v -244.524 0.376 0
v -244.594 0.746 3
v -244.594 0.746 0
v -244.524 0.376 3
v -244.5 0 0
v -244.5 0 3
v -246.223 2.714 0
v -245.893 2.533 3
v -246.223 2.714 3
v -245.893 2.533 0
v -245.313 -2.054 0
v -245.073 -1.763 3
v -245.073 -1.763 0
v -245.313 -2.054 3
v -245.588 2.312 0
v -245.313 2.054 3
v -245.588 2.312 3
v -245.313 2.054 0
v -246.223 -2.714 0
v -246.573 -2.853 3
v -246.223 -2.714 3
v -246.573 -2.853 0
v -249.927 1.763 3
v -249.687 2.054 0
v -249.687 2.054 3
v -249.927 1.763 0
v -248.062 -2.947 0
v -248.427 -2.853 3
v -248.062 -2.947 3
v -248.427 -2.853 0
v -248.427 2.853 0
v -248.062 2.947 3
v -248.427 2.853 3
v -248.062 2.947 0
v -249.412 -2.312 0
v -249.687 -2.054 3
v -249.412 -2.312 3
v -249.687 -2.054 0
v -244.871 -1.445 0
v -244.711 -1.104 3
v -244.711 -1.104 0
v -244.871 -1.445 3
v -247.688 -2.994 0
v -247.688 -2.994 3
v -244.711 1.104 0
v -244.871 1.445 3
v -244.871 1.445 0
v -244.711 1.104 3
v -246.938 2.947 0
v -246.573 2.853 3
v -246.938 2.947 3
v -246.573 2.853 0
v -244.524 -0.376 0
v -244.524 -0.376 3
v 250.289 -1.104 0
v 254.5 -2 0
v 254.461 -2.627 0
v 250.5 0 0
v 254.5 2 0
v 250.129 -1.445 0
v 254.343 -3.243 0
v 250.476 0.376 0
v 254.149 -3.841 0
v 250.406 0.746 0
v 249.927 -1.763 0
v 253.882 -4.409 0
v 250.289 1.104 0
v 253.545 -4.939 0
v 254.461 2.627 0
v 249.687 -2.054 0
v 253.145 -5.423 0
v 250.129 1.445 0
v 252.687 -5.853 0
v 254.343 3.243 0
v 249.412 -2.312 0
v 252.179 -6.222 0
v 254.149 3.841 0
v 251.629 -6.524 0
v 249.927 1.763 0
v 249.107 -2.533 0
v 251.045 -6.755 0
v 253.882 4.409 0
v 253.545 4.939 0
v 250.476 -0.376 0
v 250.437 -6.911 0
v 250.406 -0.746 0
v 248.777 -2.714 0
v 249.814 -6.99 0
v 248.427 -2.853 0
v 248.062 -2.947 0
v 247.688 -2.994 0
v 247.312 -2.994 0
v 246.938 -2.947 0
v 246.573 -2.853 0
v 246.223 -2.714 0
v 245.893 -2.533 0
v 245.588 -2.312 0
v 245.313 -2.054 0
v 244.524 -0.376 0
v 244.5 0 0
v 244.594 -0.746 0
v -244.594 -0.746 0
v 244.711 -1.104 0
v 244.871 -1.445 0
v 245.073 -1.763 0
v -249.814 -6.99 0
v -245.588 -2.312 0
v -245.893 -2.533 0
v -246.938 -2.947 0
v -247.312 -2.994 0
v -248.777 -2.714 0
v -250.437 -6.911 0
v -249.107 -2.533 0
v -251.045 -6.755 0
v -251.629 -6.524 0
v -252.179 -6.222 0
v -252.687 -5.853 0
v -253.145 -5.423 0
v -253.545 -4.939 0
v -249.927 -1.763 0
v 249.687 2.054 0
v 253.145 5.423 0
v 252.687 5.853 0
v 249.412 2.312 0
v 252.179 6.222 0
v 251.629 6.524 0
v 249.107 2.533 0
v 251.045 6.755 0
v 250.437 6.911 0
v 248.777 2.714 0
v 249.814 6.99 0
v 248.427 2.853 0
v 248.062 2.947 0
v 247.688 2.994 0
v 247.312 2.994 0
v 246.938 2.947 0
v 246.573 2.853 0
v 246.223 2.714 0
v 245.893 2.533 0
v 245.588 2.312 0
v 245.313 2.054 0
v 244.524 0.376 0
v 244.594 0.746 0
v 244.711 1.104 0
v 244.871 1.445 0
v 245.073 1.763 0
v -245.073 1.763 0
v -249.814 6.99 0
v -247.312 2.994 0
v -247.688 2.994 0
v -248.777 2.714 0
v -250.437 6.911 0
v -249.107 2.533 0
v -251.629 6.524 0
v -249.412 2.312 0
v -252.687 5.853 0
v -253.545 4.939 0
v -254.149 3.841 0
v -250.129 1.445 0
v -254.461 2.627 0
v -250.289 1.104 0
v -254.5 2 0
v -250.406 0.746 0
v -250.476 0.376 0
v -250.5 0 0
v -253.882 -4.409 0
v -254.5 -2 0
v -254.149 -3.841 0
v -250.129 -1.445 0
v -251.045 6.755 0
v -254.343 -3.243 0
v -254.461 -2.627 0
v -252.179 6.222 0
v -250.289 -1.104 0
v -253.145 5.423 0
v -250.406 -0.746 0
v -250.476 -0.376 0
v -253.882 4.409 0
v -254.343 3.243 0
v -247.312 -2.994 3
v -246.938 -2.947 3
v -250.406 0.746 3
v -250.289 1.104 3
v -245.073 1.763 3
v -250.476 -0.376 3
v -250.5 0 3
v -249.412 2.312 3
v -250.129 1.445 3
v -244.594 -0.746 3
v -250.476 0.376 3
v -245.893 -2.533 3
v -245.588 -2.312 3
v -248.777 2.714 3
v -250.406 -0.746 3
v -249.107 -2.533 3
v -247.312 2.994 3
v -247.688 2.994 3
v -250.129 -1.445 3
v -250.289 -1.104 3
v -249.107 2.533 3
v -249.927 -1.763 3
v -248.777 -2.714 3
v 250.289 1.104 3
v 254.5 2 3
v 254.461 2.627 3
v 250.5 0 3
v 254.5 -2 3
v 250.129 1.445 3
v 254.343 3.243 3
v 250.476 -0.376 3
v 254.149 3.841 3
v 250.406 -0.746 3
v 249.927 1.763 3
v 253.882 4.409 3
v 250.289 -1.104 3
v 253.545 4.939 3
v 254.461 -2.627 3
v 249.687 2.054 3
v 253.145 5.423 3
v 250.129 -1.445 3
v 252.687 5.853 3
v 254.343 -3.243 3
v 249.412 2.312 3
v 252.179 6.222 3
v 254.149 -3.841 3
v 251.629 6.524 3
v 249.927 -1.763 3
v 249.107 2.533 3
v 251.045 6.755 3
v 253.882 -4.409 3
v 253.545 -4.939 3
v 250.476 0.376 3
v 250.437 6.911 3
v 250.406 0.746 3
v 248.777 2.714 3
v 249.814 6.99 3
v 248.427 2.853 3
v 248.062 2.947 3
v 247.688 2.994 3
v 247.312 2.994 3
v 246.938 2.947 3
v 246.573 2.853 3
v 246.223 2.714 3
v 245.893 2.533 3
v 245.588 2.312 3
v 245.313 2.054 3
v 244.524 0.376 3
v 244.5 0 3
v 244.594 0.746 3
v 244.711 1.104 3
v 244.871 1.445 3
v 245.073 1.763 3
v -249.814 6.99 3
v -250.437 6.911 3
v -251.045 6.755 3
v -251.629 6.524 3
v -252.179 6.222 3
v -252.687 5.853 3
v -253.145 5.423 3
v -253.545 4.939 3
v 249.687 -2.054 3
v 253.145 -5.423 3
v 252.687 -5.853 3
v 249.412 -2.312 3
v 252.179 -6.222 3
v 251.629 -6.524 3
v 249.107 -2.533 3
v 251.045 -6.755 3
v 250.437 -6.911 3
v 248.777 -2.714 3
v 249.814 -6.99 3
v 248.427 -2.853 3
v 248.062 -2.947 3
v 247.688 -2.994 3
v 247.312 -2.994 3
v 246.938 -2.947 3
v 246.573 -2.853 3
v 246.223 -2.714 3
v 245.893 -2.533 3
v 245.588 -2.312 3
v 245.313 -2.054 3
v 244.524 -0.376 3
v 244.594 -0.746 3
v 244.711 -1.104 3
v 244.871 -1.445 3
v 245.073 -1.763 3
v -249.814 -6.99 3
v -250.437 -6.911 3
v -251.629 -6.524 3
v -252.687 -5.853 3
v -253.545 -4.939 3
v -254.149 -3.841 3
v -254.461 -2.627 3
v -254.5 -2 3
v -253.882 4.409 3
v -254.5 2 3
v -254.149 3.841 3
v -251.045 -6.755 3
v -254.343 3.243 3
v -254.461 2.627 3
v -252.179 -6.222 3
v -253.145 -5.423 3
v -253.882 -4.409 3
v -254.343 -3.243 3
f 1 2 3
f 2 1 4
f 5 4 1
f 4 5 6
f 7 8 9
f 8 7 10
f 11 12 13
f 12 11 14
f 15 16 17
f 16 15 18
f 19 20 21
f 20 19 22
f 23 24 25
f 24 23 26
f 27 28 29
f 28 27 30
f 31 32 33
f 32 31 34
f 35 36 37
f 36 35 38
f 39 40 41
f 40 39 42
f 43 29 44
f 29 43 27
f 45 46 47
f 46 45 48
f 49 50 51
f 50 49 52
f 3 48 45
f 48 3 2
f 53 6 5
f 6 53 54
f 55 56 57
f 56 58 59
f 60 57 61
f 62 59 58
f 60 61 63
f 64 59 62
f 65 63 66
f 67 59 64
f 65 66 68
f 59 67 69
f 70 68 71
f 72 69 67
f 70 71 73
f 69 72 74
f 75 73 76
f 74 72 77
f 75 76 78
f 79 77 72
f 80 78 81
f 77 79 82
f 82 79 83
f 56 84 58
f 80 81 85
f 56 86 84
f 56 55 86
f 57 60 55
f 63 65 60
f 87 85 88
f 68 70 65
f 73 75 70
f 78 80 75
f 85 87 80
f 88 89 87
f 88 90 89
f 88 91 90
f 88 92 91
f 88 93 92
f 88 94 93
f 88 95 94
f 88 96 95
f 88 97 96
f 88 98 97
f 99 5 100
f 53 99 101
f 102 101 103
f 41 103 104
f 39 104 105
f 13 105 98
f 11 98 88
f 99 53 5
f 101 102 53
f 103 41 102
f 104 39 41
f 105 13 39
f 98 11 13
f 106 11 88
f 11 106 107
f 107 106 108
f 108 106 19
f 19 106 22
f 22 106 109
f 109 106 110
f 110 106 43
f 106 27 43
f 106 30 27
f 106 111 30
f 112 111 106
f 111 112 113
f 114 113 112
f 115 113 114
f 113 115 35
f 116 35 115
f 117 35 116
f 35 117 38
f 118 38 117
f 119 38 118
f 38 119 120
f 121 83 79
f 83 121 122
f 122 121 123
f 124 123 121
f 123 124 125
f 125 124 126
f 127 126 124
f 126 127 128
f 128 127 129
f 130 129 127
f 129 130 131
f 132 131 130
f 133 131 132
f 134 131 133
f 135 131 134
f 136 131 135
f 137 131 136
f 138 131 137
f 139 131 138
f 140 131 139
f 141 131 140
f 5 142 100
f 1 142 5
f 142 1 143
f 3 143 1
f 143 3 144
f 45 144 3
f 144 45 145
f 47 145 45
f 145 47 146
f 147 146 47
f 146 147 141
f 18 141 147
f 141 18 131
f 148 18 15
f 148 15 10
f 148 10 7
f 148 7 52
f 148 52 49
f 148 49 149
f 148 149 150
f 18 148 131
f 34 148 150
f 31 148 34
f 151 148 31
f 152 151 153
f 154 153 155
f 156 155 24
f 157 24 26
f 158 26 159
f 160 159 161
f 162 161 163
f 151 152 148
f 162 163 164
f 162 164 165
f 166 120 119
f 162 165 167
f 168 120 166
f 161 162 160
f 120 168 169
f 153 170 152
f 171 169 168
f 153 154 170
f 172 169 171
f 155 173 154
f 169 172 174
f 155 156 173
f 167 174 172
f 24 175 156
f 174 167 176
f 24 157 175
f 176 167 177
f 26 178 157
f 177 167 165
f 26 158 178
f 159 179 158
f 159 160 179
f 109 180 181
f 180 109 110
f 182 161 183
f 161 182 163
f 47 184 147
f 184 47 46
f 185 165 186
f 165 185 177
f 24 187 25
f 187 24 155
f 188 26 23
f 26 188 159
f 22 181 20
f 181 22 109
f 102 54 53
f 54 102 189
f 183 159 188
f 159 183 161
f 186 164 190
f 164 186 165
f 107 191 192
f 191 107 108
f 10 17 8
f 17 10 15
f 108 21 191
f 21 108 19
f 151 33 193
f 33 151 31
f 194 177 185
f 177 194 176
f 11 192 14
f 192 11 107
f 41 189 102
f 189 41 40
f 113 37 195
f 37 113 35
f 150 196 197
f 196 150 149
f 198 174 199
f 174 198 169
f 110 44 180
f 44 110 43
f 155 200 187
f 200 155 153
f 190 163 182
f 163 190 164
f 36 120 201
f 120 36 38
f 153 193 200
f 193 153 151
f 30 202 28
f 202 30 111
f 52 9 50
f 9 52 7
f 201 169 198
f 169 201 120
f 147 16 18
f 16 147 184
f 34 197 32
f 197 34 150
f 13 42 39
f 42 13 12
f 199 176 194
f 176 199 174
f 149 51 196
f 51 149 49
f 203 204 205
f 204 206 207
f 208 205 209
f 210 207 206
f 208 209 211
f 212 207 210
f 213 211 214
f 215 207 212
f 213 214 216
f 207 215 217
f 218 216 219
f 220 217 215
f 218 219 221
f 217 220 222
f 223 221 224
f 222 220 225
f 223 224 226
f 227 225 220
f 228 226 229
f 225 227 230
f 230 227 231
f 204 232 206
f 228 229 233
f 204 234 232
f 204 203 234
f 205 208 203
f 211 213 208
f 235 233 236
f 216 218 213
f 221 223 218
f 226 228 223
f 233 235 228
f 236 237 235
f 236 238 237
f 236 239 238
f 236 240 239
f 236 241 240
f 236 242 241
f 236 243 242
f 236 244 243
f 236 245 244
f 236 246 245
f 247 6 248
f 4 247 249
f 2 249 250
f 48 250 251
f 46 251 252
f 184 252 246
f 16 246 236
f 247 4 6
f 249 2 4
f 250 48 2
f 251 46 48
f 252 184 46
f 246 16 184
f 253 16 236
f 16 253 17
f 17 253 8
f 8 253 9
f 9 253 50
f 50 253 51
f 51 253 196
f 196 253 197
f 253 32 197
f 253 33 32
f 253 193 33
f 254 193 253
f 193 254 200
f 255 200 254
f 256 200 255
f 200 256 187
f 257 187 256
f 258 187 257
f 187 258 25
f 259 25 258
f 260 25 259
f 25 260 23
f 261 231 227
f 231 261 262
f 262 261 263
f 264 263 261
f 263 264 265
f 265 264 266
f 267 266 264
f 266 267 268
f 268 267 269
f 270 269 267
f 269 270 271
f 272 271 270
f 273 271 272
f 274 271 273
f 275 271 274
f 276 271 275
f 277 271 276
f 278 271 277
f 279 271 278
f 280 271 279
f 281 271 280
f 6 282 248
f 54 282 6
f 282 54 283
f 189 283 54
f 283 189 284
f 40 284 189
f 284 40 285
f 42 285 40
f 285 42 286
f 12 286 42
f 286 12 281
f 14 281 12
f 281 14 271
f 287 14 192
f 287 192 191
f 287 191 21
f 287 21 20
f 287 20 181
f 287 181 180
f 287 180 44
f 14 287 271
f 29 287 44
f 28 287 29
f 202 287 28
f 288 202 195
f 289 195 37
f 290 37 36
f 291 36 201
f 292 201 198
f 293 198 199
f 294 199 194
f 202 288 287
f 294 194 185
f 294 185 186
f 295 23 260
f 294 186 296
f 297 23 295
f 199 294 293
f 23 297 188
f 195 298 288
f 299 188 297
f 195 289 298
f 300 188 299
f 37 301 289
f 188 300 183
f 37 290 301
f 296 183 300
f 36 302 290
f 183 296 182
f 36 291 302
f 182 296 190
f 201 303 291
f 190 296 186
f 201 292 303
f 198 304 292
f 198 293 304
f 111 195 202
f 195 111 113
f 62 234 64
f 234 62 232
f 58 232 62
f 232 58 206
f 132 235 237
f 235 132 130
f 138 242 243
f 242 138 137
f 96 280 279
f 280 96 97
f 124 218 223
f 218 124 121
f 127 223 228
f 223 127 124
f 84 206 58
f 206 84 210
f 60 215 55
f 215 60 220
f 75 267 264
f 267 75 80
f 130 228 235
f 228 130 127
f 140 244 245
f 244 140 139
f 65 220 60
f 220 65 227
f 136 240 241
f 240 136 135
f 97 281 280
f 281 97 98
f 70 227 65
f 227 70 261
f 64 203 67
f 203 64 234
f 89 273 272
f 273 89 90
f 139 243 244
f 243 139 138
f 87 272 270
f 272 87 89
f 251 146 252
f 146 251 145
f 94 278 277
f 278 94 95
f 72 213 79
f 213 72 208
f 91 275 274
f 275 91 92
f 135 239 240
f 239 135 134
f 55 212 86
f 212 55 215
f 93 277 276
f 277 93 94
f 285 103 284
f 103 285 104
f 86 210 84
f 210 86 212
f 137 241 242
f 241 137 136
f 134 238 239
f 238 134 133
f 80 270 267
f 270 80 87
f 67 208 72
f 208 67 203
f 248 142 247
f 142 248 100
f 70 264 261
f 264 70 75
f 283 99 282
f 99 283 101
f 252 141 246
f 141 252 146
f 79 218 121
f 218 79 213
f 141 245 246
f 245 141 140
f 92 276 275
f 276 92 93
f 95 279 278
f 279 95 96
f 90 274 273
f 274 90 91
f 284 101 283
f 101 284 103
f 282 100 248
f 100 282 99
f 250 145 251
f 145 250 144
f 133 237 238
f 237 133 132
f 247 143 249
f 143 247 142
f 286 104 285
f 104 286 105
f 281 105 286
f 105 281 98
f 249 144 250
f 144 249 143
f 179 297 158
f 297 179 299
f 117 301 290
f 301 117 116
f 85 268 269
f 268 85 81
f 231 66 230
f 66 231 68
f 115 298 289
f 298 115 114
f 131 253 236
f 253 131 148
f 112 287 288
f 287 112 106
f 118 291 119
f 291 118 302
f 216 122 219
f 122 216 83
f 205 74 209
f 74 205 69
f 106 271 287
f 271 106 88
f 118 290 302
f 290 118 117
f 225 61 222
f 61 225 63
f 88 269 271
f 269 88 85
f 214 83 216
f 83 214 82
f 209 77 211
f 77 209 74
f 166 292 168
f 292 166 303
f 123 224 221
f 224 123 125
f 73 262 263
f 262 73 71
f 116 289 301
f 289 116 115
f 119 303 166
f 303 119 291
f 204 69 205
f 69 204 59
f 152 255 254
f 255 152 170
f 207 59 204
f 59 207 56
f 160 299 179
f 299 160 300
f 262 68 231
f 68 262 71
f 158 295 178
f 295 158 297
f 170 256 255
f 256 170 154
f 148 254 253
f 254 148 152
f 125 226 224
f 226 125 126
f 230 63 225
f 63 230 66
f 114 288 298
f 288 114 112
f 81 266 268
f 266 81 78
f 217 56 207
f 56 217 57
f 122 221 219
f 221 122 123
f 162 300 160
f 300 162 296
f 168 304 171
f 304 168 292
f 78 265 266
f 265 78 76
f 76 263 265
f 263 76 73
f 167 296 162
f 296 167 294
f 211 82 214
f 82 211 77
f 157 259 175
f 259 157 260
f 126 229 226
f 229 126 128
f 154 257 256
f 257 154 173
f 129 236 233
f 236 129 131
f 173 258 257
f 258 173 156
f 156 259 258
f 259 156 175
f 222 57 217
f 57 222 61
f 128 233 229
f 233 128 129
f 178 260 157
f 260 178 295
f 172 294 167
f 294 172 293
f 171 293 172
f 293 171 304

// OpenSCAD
$fn = 50;


difference() {
	union() {
		hull() {
			translate(v = [-249.5000000000, 2.0000000000, 0]) {
				cylinder(h = 3, r = 5);
			}
			translate(v = [249.5000000000, 2.0000000000, 0]) {
				cylinder(h = 3, r = 5);
			}
			translate(v = [-249.5000000000, -2.0000000000, 0]) {
				cylinder(h = 3, r = 5);
			}
			translate(v = [249.5000000000, -2.0000000000, 0]) {
				cylinder(h = 3, r = 5);
			}
		}
	}
	union() {
		translate(v = [-247.5000000000, 0.0000000000, 0]) {
			cylinder(h = 3, r = 3.0000000000);
		}
		translate(v = [247.5000000000, 0.0000000000, 0]) {
			cylinder(h = 3, r = 3.0000000000);
		}
		translate(v = [-247.5000000000, 0.0000000000, 0]) {
			cylinder(h = 3, r = 1.5000000000);
		}
		translate(v = [247.5000000000, 0.0000000000, 0]) {
			cylinder(h = 3, r = 1.5000000000);
		}
		translate(v = [-247.5000000000, 0.0000000000, 0]) {
			cylinder(h = 3, r = 1.5000000000);
		}
		translate(v = [247.5000000000, 0.0000000000, 0]) {
			cylinder(h = 3, r = 1.5000000000);
		}
		translate(v = [-247.5000000000, 0.0000000000, 0]) {
			cylinder(h = 3, r = 1.5000000000);
		}
		translate(v = [247.5000000000, 0.0000000000, 0]) {
			cylinder(h = 3, r = 1.5000000000);
		}
	}
}
